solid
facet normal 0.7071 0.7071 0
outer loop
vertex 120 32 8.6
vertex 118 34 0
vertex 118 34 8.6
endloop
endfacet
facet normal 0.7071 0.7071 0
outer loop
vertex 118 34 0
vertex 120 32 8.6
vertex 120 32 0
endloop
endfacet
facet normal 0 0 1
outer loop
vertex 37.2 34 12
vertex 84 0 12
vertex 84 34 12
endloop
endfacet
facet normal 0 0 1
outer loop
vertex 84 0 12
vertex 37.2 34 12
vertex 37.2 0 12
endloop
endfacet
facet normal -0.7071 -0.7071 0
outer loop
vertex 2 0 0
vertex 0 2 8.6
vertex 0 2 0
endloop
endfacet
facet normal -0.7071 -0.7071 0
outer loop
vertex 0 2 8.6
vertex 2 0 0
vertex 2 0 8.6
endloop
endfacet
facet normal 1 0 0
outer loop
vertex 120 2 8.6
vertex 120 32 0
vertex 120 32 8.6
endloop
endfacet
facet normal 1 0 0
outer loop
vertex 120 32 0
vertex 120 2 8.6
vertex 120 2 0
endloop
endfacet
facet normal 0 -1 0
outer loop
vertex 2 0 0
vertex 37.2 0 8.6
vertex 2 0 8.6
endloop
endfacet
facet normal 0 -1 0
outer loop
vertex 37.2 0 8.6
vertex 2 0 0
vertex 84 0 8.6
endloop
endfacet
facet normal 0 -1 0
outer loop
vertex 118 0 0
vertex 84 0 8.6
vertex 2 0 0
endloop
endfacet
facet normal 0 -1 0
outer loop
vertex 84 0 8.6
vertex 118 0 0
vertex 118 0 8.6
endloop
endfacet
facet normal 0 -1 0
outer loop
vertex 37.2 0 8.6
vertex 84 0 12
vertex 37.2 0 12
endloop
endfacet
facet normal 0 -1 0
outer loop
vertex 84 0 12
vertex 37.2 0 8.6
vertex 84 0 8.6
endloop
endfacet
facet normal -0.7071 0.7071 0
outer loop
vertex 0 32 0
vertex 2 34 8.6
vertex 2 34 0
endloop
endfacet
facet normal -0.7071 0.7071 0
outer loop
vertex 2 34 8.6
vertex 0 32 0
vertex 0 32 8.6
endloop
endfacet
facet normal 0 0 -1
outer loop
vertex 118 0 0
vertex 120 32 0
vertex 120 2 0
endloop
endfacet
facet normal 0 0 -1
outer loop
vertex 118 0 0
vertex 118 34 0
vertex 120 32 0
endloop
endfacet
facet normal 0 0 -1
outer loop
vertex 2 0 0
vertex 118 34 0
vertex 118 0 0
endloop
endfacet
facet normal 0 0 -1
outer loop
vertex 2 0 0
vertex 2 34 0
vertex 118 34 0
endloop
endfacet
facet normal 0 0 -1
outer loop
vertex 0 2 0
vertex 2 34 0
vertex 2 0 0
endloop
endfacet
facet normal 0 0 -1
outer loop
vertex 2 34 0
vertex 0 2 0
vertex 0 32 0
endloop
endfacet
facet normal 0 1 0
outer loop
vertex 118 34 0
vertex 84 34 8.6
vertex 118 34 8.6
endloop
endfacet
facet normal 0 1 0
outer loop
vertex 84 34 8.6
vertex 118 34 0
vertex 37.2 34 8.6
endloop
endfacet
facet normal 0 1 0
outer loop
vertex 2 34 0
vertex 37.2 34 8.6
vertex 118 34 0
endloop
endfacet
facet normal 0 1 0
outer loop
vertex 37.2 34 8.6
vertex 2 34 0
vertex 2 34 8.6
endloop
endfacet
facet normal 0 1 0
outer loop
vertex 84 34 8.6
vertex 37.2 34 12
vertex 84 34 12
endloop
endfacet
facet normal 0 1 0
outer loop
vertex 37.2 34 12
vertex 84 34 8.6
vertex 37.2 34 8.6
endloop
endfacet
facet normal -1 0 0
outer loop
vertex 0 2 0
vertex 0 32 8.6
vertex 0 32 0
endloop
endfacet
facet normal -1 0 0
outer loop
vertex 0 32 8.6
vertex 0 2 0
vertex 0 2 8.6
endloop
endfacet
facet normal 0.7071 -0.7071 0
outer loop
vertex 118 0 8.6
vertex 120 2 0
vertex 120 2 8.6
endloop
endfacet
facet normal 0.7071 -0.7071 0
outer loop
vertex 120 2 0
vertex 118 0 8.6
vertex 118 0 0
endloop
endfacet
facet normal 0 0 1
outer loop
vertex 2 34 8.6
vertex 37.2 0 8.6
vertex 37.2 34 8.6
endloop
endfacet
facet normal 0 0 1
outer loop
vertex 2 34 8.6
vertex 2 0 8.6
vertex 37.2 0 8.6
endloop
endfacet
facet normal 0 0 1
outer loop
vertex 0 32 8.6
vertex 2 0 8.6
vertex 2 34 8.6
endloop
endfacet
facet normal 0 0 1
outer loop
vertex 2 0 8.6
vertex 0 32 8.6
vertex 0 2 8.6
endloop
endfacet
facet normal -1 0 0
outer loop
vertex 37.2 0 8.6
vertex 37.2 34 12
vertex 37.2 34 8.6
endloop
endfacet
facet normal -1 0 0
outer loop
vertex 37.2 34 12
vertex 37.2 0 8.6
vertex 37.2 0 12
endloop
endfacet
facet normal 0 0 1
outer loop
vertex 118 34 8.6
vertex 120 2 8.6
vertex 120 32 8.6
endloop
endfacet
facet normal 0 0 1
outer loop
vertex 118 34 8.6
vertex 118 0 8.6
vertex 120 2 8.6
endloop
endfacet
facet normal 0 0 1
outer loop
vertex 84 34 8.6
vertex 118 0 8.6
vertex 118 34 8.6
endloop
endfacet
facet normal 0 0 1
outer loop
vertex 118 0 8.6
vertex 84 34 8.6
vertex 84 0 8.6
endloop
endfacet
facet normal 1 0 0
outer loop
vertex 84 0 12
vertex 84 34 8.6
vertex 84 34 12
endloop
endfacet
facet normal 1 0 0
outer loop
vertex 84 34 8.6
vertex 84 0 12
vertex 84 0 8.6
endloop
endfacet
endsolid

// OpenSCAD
$fn = 32;

// ----------------------------------------------------------------------
// Stepped bar: centerstep, 120 x 34 x 12/8.6 mm
// ----------------------------------------------------------------------

// --- parameters (mm) ---
bar_l = 120;              // bar length, X
bar_w = 34;               // bar width, Y
plate_t = 12;             // thickness of the thick zone, Z
thin_t = 8.6;             // thickness of the thin zone
corner_c = 2;             // corner chamfer of the bar
step_cut = 3.4;           // material removed from the thin zone
thick_from = 37.2;        // start of the thick middle zone
thick_to = 84;            // end of the thick middle zone
depth_1 = 3.4;            // depth of cut 1 from the top face
depth_2 = 3.4;            // depth of cut 2 from the top face
fit_tol = 0.05;           // declared fit tolerance (prompt contract)
free_tol = 0.3;           // declared free tolerance (prompt contract)

profile = [[2, 0], [118, 0], [120, 2], [120, 32], [118, 34], [2, 34], [0, 32], [0, 2]];  // primary outline, 8 points, counter clockwise
void_1 = [[-1, -1], [37.2, -1], [37.2, 35], [-1, 35]];  // thin left end, 4 points
void_2 = [[84, -1], [121, -1], [121, 35], [84, 35]];  // thin right end, 4 points

// --- the one profile operation ---
difference() {
  linear_extrude(height = plate_t) polygon(points = profile);
  translate([0, 0, plate_t - depth_1])
    linear_extrude(height = depth_1 + 1) polygon(points = void_1);
  translate([0, 0, plate_t - depth_2])
    linear_extrude(height = depth_2 + 1) polygon(points = void_2);
}
